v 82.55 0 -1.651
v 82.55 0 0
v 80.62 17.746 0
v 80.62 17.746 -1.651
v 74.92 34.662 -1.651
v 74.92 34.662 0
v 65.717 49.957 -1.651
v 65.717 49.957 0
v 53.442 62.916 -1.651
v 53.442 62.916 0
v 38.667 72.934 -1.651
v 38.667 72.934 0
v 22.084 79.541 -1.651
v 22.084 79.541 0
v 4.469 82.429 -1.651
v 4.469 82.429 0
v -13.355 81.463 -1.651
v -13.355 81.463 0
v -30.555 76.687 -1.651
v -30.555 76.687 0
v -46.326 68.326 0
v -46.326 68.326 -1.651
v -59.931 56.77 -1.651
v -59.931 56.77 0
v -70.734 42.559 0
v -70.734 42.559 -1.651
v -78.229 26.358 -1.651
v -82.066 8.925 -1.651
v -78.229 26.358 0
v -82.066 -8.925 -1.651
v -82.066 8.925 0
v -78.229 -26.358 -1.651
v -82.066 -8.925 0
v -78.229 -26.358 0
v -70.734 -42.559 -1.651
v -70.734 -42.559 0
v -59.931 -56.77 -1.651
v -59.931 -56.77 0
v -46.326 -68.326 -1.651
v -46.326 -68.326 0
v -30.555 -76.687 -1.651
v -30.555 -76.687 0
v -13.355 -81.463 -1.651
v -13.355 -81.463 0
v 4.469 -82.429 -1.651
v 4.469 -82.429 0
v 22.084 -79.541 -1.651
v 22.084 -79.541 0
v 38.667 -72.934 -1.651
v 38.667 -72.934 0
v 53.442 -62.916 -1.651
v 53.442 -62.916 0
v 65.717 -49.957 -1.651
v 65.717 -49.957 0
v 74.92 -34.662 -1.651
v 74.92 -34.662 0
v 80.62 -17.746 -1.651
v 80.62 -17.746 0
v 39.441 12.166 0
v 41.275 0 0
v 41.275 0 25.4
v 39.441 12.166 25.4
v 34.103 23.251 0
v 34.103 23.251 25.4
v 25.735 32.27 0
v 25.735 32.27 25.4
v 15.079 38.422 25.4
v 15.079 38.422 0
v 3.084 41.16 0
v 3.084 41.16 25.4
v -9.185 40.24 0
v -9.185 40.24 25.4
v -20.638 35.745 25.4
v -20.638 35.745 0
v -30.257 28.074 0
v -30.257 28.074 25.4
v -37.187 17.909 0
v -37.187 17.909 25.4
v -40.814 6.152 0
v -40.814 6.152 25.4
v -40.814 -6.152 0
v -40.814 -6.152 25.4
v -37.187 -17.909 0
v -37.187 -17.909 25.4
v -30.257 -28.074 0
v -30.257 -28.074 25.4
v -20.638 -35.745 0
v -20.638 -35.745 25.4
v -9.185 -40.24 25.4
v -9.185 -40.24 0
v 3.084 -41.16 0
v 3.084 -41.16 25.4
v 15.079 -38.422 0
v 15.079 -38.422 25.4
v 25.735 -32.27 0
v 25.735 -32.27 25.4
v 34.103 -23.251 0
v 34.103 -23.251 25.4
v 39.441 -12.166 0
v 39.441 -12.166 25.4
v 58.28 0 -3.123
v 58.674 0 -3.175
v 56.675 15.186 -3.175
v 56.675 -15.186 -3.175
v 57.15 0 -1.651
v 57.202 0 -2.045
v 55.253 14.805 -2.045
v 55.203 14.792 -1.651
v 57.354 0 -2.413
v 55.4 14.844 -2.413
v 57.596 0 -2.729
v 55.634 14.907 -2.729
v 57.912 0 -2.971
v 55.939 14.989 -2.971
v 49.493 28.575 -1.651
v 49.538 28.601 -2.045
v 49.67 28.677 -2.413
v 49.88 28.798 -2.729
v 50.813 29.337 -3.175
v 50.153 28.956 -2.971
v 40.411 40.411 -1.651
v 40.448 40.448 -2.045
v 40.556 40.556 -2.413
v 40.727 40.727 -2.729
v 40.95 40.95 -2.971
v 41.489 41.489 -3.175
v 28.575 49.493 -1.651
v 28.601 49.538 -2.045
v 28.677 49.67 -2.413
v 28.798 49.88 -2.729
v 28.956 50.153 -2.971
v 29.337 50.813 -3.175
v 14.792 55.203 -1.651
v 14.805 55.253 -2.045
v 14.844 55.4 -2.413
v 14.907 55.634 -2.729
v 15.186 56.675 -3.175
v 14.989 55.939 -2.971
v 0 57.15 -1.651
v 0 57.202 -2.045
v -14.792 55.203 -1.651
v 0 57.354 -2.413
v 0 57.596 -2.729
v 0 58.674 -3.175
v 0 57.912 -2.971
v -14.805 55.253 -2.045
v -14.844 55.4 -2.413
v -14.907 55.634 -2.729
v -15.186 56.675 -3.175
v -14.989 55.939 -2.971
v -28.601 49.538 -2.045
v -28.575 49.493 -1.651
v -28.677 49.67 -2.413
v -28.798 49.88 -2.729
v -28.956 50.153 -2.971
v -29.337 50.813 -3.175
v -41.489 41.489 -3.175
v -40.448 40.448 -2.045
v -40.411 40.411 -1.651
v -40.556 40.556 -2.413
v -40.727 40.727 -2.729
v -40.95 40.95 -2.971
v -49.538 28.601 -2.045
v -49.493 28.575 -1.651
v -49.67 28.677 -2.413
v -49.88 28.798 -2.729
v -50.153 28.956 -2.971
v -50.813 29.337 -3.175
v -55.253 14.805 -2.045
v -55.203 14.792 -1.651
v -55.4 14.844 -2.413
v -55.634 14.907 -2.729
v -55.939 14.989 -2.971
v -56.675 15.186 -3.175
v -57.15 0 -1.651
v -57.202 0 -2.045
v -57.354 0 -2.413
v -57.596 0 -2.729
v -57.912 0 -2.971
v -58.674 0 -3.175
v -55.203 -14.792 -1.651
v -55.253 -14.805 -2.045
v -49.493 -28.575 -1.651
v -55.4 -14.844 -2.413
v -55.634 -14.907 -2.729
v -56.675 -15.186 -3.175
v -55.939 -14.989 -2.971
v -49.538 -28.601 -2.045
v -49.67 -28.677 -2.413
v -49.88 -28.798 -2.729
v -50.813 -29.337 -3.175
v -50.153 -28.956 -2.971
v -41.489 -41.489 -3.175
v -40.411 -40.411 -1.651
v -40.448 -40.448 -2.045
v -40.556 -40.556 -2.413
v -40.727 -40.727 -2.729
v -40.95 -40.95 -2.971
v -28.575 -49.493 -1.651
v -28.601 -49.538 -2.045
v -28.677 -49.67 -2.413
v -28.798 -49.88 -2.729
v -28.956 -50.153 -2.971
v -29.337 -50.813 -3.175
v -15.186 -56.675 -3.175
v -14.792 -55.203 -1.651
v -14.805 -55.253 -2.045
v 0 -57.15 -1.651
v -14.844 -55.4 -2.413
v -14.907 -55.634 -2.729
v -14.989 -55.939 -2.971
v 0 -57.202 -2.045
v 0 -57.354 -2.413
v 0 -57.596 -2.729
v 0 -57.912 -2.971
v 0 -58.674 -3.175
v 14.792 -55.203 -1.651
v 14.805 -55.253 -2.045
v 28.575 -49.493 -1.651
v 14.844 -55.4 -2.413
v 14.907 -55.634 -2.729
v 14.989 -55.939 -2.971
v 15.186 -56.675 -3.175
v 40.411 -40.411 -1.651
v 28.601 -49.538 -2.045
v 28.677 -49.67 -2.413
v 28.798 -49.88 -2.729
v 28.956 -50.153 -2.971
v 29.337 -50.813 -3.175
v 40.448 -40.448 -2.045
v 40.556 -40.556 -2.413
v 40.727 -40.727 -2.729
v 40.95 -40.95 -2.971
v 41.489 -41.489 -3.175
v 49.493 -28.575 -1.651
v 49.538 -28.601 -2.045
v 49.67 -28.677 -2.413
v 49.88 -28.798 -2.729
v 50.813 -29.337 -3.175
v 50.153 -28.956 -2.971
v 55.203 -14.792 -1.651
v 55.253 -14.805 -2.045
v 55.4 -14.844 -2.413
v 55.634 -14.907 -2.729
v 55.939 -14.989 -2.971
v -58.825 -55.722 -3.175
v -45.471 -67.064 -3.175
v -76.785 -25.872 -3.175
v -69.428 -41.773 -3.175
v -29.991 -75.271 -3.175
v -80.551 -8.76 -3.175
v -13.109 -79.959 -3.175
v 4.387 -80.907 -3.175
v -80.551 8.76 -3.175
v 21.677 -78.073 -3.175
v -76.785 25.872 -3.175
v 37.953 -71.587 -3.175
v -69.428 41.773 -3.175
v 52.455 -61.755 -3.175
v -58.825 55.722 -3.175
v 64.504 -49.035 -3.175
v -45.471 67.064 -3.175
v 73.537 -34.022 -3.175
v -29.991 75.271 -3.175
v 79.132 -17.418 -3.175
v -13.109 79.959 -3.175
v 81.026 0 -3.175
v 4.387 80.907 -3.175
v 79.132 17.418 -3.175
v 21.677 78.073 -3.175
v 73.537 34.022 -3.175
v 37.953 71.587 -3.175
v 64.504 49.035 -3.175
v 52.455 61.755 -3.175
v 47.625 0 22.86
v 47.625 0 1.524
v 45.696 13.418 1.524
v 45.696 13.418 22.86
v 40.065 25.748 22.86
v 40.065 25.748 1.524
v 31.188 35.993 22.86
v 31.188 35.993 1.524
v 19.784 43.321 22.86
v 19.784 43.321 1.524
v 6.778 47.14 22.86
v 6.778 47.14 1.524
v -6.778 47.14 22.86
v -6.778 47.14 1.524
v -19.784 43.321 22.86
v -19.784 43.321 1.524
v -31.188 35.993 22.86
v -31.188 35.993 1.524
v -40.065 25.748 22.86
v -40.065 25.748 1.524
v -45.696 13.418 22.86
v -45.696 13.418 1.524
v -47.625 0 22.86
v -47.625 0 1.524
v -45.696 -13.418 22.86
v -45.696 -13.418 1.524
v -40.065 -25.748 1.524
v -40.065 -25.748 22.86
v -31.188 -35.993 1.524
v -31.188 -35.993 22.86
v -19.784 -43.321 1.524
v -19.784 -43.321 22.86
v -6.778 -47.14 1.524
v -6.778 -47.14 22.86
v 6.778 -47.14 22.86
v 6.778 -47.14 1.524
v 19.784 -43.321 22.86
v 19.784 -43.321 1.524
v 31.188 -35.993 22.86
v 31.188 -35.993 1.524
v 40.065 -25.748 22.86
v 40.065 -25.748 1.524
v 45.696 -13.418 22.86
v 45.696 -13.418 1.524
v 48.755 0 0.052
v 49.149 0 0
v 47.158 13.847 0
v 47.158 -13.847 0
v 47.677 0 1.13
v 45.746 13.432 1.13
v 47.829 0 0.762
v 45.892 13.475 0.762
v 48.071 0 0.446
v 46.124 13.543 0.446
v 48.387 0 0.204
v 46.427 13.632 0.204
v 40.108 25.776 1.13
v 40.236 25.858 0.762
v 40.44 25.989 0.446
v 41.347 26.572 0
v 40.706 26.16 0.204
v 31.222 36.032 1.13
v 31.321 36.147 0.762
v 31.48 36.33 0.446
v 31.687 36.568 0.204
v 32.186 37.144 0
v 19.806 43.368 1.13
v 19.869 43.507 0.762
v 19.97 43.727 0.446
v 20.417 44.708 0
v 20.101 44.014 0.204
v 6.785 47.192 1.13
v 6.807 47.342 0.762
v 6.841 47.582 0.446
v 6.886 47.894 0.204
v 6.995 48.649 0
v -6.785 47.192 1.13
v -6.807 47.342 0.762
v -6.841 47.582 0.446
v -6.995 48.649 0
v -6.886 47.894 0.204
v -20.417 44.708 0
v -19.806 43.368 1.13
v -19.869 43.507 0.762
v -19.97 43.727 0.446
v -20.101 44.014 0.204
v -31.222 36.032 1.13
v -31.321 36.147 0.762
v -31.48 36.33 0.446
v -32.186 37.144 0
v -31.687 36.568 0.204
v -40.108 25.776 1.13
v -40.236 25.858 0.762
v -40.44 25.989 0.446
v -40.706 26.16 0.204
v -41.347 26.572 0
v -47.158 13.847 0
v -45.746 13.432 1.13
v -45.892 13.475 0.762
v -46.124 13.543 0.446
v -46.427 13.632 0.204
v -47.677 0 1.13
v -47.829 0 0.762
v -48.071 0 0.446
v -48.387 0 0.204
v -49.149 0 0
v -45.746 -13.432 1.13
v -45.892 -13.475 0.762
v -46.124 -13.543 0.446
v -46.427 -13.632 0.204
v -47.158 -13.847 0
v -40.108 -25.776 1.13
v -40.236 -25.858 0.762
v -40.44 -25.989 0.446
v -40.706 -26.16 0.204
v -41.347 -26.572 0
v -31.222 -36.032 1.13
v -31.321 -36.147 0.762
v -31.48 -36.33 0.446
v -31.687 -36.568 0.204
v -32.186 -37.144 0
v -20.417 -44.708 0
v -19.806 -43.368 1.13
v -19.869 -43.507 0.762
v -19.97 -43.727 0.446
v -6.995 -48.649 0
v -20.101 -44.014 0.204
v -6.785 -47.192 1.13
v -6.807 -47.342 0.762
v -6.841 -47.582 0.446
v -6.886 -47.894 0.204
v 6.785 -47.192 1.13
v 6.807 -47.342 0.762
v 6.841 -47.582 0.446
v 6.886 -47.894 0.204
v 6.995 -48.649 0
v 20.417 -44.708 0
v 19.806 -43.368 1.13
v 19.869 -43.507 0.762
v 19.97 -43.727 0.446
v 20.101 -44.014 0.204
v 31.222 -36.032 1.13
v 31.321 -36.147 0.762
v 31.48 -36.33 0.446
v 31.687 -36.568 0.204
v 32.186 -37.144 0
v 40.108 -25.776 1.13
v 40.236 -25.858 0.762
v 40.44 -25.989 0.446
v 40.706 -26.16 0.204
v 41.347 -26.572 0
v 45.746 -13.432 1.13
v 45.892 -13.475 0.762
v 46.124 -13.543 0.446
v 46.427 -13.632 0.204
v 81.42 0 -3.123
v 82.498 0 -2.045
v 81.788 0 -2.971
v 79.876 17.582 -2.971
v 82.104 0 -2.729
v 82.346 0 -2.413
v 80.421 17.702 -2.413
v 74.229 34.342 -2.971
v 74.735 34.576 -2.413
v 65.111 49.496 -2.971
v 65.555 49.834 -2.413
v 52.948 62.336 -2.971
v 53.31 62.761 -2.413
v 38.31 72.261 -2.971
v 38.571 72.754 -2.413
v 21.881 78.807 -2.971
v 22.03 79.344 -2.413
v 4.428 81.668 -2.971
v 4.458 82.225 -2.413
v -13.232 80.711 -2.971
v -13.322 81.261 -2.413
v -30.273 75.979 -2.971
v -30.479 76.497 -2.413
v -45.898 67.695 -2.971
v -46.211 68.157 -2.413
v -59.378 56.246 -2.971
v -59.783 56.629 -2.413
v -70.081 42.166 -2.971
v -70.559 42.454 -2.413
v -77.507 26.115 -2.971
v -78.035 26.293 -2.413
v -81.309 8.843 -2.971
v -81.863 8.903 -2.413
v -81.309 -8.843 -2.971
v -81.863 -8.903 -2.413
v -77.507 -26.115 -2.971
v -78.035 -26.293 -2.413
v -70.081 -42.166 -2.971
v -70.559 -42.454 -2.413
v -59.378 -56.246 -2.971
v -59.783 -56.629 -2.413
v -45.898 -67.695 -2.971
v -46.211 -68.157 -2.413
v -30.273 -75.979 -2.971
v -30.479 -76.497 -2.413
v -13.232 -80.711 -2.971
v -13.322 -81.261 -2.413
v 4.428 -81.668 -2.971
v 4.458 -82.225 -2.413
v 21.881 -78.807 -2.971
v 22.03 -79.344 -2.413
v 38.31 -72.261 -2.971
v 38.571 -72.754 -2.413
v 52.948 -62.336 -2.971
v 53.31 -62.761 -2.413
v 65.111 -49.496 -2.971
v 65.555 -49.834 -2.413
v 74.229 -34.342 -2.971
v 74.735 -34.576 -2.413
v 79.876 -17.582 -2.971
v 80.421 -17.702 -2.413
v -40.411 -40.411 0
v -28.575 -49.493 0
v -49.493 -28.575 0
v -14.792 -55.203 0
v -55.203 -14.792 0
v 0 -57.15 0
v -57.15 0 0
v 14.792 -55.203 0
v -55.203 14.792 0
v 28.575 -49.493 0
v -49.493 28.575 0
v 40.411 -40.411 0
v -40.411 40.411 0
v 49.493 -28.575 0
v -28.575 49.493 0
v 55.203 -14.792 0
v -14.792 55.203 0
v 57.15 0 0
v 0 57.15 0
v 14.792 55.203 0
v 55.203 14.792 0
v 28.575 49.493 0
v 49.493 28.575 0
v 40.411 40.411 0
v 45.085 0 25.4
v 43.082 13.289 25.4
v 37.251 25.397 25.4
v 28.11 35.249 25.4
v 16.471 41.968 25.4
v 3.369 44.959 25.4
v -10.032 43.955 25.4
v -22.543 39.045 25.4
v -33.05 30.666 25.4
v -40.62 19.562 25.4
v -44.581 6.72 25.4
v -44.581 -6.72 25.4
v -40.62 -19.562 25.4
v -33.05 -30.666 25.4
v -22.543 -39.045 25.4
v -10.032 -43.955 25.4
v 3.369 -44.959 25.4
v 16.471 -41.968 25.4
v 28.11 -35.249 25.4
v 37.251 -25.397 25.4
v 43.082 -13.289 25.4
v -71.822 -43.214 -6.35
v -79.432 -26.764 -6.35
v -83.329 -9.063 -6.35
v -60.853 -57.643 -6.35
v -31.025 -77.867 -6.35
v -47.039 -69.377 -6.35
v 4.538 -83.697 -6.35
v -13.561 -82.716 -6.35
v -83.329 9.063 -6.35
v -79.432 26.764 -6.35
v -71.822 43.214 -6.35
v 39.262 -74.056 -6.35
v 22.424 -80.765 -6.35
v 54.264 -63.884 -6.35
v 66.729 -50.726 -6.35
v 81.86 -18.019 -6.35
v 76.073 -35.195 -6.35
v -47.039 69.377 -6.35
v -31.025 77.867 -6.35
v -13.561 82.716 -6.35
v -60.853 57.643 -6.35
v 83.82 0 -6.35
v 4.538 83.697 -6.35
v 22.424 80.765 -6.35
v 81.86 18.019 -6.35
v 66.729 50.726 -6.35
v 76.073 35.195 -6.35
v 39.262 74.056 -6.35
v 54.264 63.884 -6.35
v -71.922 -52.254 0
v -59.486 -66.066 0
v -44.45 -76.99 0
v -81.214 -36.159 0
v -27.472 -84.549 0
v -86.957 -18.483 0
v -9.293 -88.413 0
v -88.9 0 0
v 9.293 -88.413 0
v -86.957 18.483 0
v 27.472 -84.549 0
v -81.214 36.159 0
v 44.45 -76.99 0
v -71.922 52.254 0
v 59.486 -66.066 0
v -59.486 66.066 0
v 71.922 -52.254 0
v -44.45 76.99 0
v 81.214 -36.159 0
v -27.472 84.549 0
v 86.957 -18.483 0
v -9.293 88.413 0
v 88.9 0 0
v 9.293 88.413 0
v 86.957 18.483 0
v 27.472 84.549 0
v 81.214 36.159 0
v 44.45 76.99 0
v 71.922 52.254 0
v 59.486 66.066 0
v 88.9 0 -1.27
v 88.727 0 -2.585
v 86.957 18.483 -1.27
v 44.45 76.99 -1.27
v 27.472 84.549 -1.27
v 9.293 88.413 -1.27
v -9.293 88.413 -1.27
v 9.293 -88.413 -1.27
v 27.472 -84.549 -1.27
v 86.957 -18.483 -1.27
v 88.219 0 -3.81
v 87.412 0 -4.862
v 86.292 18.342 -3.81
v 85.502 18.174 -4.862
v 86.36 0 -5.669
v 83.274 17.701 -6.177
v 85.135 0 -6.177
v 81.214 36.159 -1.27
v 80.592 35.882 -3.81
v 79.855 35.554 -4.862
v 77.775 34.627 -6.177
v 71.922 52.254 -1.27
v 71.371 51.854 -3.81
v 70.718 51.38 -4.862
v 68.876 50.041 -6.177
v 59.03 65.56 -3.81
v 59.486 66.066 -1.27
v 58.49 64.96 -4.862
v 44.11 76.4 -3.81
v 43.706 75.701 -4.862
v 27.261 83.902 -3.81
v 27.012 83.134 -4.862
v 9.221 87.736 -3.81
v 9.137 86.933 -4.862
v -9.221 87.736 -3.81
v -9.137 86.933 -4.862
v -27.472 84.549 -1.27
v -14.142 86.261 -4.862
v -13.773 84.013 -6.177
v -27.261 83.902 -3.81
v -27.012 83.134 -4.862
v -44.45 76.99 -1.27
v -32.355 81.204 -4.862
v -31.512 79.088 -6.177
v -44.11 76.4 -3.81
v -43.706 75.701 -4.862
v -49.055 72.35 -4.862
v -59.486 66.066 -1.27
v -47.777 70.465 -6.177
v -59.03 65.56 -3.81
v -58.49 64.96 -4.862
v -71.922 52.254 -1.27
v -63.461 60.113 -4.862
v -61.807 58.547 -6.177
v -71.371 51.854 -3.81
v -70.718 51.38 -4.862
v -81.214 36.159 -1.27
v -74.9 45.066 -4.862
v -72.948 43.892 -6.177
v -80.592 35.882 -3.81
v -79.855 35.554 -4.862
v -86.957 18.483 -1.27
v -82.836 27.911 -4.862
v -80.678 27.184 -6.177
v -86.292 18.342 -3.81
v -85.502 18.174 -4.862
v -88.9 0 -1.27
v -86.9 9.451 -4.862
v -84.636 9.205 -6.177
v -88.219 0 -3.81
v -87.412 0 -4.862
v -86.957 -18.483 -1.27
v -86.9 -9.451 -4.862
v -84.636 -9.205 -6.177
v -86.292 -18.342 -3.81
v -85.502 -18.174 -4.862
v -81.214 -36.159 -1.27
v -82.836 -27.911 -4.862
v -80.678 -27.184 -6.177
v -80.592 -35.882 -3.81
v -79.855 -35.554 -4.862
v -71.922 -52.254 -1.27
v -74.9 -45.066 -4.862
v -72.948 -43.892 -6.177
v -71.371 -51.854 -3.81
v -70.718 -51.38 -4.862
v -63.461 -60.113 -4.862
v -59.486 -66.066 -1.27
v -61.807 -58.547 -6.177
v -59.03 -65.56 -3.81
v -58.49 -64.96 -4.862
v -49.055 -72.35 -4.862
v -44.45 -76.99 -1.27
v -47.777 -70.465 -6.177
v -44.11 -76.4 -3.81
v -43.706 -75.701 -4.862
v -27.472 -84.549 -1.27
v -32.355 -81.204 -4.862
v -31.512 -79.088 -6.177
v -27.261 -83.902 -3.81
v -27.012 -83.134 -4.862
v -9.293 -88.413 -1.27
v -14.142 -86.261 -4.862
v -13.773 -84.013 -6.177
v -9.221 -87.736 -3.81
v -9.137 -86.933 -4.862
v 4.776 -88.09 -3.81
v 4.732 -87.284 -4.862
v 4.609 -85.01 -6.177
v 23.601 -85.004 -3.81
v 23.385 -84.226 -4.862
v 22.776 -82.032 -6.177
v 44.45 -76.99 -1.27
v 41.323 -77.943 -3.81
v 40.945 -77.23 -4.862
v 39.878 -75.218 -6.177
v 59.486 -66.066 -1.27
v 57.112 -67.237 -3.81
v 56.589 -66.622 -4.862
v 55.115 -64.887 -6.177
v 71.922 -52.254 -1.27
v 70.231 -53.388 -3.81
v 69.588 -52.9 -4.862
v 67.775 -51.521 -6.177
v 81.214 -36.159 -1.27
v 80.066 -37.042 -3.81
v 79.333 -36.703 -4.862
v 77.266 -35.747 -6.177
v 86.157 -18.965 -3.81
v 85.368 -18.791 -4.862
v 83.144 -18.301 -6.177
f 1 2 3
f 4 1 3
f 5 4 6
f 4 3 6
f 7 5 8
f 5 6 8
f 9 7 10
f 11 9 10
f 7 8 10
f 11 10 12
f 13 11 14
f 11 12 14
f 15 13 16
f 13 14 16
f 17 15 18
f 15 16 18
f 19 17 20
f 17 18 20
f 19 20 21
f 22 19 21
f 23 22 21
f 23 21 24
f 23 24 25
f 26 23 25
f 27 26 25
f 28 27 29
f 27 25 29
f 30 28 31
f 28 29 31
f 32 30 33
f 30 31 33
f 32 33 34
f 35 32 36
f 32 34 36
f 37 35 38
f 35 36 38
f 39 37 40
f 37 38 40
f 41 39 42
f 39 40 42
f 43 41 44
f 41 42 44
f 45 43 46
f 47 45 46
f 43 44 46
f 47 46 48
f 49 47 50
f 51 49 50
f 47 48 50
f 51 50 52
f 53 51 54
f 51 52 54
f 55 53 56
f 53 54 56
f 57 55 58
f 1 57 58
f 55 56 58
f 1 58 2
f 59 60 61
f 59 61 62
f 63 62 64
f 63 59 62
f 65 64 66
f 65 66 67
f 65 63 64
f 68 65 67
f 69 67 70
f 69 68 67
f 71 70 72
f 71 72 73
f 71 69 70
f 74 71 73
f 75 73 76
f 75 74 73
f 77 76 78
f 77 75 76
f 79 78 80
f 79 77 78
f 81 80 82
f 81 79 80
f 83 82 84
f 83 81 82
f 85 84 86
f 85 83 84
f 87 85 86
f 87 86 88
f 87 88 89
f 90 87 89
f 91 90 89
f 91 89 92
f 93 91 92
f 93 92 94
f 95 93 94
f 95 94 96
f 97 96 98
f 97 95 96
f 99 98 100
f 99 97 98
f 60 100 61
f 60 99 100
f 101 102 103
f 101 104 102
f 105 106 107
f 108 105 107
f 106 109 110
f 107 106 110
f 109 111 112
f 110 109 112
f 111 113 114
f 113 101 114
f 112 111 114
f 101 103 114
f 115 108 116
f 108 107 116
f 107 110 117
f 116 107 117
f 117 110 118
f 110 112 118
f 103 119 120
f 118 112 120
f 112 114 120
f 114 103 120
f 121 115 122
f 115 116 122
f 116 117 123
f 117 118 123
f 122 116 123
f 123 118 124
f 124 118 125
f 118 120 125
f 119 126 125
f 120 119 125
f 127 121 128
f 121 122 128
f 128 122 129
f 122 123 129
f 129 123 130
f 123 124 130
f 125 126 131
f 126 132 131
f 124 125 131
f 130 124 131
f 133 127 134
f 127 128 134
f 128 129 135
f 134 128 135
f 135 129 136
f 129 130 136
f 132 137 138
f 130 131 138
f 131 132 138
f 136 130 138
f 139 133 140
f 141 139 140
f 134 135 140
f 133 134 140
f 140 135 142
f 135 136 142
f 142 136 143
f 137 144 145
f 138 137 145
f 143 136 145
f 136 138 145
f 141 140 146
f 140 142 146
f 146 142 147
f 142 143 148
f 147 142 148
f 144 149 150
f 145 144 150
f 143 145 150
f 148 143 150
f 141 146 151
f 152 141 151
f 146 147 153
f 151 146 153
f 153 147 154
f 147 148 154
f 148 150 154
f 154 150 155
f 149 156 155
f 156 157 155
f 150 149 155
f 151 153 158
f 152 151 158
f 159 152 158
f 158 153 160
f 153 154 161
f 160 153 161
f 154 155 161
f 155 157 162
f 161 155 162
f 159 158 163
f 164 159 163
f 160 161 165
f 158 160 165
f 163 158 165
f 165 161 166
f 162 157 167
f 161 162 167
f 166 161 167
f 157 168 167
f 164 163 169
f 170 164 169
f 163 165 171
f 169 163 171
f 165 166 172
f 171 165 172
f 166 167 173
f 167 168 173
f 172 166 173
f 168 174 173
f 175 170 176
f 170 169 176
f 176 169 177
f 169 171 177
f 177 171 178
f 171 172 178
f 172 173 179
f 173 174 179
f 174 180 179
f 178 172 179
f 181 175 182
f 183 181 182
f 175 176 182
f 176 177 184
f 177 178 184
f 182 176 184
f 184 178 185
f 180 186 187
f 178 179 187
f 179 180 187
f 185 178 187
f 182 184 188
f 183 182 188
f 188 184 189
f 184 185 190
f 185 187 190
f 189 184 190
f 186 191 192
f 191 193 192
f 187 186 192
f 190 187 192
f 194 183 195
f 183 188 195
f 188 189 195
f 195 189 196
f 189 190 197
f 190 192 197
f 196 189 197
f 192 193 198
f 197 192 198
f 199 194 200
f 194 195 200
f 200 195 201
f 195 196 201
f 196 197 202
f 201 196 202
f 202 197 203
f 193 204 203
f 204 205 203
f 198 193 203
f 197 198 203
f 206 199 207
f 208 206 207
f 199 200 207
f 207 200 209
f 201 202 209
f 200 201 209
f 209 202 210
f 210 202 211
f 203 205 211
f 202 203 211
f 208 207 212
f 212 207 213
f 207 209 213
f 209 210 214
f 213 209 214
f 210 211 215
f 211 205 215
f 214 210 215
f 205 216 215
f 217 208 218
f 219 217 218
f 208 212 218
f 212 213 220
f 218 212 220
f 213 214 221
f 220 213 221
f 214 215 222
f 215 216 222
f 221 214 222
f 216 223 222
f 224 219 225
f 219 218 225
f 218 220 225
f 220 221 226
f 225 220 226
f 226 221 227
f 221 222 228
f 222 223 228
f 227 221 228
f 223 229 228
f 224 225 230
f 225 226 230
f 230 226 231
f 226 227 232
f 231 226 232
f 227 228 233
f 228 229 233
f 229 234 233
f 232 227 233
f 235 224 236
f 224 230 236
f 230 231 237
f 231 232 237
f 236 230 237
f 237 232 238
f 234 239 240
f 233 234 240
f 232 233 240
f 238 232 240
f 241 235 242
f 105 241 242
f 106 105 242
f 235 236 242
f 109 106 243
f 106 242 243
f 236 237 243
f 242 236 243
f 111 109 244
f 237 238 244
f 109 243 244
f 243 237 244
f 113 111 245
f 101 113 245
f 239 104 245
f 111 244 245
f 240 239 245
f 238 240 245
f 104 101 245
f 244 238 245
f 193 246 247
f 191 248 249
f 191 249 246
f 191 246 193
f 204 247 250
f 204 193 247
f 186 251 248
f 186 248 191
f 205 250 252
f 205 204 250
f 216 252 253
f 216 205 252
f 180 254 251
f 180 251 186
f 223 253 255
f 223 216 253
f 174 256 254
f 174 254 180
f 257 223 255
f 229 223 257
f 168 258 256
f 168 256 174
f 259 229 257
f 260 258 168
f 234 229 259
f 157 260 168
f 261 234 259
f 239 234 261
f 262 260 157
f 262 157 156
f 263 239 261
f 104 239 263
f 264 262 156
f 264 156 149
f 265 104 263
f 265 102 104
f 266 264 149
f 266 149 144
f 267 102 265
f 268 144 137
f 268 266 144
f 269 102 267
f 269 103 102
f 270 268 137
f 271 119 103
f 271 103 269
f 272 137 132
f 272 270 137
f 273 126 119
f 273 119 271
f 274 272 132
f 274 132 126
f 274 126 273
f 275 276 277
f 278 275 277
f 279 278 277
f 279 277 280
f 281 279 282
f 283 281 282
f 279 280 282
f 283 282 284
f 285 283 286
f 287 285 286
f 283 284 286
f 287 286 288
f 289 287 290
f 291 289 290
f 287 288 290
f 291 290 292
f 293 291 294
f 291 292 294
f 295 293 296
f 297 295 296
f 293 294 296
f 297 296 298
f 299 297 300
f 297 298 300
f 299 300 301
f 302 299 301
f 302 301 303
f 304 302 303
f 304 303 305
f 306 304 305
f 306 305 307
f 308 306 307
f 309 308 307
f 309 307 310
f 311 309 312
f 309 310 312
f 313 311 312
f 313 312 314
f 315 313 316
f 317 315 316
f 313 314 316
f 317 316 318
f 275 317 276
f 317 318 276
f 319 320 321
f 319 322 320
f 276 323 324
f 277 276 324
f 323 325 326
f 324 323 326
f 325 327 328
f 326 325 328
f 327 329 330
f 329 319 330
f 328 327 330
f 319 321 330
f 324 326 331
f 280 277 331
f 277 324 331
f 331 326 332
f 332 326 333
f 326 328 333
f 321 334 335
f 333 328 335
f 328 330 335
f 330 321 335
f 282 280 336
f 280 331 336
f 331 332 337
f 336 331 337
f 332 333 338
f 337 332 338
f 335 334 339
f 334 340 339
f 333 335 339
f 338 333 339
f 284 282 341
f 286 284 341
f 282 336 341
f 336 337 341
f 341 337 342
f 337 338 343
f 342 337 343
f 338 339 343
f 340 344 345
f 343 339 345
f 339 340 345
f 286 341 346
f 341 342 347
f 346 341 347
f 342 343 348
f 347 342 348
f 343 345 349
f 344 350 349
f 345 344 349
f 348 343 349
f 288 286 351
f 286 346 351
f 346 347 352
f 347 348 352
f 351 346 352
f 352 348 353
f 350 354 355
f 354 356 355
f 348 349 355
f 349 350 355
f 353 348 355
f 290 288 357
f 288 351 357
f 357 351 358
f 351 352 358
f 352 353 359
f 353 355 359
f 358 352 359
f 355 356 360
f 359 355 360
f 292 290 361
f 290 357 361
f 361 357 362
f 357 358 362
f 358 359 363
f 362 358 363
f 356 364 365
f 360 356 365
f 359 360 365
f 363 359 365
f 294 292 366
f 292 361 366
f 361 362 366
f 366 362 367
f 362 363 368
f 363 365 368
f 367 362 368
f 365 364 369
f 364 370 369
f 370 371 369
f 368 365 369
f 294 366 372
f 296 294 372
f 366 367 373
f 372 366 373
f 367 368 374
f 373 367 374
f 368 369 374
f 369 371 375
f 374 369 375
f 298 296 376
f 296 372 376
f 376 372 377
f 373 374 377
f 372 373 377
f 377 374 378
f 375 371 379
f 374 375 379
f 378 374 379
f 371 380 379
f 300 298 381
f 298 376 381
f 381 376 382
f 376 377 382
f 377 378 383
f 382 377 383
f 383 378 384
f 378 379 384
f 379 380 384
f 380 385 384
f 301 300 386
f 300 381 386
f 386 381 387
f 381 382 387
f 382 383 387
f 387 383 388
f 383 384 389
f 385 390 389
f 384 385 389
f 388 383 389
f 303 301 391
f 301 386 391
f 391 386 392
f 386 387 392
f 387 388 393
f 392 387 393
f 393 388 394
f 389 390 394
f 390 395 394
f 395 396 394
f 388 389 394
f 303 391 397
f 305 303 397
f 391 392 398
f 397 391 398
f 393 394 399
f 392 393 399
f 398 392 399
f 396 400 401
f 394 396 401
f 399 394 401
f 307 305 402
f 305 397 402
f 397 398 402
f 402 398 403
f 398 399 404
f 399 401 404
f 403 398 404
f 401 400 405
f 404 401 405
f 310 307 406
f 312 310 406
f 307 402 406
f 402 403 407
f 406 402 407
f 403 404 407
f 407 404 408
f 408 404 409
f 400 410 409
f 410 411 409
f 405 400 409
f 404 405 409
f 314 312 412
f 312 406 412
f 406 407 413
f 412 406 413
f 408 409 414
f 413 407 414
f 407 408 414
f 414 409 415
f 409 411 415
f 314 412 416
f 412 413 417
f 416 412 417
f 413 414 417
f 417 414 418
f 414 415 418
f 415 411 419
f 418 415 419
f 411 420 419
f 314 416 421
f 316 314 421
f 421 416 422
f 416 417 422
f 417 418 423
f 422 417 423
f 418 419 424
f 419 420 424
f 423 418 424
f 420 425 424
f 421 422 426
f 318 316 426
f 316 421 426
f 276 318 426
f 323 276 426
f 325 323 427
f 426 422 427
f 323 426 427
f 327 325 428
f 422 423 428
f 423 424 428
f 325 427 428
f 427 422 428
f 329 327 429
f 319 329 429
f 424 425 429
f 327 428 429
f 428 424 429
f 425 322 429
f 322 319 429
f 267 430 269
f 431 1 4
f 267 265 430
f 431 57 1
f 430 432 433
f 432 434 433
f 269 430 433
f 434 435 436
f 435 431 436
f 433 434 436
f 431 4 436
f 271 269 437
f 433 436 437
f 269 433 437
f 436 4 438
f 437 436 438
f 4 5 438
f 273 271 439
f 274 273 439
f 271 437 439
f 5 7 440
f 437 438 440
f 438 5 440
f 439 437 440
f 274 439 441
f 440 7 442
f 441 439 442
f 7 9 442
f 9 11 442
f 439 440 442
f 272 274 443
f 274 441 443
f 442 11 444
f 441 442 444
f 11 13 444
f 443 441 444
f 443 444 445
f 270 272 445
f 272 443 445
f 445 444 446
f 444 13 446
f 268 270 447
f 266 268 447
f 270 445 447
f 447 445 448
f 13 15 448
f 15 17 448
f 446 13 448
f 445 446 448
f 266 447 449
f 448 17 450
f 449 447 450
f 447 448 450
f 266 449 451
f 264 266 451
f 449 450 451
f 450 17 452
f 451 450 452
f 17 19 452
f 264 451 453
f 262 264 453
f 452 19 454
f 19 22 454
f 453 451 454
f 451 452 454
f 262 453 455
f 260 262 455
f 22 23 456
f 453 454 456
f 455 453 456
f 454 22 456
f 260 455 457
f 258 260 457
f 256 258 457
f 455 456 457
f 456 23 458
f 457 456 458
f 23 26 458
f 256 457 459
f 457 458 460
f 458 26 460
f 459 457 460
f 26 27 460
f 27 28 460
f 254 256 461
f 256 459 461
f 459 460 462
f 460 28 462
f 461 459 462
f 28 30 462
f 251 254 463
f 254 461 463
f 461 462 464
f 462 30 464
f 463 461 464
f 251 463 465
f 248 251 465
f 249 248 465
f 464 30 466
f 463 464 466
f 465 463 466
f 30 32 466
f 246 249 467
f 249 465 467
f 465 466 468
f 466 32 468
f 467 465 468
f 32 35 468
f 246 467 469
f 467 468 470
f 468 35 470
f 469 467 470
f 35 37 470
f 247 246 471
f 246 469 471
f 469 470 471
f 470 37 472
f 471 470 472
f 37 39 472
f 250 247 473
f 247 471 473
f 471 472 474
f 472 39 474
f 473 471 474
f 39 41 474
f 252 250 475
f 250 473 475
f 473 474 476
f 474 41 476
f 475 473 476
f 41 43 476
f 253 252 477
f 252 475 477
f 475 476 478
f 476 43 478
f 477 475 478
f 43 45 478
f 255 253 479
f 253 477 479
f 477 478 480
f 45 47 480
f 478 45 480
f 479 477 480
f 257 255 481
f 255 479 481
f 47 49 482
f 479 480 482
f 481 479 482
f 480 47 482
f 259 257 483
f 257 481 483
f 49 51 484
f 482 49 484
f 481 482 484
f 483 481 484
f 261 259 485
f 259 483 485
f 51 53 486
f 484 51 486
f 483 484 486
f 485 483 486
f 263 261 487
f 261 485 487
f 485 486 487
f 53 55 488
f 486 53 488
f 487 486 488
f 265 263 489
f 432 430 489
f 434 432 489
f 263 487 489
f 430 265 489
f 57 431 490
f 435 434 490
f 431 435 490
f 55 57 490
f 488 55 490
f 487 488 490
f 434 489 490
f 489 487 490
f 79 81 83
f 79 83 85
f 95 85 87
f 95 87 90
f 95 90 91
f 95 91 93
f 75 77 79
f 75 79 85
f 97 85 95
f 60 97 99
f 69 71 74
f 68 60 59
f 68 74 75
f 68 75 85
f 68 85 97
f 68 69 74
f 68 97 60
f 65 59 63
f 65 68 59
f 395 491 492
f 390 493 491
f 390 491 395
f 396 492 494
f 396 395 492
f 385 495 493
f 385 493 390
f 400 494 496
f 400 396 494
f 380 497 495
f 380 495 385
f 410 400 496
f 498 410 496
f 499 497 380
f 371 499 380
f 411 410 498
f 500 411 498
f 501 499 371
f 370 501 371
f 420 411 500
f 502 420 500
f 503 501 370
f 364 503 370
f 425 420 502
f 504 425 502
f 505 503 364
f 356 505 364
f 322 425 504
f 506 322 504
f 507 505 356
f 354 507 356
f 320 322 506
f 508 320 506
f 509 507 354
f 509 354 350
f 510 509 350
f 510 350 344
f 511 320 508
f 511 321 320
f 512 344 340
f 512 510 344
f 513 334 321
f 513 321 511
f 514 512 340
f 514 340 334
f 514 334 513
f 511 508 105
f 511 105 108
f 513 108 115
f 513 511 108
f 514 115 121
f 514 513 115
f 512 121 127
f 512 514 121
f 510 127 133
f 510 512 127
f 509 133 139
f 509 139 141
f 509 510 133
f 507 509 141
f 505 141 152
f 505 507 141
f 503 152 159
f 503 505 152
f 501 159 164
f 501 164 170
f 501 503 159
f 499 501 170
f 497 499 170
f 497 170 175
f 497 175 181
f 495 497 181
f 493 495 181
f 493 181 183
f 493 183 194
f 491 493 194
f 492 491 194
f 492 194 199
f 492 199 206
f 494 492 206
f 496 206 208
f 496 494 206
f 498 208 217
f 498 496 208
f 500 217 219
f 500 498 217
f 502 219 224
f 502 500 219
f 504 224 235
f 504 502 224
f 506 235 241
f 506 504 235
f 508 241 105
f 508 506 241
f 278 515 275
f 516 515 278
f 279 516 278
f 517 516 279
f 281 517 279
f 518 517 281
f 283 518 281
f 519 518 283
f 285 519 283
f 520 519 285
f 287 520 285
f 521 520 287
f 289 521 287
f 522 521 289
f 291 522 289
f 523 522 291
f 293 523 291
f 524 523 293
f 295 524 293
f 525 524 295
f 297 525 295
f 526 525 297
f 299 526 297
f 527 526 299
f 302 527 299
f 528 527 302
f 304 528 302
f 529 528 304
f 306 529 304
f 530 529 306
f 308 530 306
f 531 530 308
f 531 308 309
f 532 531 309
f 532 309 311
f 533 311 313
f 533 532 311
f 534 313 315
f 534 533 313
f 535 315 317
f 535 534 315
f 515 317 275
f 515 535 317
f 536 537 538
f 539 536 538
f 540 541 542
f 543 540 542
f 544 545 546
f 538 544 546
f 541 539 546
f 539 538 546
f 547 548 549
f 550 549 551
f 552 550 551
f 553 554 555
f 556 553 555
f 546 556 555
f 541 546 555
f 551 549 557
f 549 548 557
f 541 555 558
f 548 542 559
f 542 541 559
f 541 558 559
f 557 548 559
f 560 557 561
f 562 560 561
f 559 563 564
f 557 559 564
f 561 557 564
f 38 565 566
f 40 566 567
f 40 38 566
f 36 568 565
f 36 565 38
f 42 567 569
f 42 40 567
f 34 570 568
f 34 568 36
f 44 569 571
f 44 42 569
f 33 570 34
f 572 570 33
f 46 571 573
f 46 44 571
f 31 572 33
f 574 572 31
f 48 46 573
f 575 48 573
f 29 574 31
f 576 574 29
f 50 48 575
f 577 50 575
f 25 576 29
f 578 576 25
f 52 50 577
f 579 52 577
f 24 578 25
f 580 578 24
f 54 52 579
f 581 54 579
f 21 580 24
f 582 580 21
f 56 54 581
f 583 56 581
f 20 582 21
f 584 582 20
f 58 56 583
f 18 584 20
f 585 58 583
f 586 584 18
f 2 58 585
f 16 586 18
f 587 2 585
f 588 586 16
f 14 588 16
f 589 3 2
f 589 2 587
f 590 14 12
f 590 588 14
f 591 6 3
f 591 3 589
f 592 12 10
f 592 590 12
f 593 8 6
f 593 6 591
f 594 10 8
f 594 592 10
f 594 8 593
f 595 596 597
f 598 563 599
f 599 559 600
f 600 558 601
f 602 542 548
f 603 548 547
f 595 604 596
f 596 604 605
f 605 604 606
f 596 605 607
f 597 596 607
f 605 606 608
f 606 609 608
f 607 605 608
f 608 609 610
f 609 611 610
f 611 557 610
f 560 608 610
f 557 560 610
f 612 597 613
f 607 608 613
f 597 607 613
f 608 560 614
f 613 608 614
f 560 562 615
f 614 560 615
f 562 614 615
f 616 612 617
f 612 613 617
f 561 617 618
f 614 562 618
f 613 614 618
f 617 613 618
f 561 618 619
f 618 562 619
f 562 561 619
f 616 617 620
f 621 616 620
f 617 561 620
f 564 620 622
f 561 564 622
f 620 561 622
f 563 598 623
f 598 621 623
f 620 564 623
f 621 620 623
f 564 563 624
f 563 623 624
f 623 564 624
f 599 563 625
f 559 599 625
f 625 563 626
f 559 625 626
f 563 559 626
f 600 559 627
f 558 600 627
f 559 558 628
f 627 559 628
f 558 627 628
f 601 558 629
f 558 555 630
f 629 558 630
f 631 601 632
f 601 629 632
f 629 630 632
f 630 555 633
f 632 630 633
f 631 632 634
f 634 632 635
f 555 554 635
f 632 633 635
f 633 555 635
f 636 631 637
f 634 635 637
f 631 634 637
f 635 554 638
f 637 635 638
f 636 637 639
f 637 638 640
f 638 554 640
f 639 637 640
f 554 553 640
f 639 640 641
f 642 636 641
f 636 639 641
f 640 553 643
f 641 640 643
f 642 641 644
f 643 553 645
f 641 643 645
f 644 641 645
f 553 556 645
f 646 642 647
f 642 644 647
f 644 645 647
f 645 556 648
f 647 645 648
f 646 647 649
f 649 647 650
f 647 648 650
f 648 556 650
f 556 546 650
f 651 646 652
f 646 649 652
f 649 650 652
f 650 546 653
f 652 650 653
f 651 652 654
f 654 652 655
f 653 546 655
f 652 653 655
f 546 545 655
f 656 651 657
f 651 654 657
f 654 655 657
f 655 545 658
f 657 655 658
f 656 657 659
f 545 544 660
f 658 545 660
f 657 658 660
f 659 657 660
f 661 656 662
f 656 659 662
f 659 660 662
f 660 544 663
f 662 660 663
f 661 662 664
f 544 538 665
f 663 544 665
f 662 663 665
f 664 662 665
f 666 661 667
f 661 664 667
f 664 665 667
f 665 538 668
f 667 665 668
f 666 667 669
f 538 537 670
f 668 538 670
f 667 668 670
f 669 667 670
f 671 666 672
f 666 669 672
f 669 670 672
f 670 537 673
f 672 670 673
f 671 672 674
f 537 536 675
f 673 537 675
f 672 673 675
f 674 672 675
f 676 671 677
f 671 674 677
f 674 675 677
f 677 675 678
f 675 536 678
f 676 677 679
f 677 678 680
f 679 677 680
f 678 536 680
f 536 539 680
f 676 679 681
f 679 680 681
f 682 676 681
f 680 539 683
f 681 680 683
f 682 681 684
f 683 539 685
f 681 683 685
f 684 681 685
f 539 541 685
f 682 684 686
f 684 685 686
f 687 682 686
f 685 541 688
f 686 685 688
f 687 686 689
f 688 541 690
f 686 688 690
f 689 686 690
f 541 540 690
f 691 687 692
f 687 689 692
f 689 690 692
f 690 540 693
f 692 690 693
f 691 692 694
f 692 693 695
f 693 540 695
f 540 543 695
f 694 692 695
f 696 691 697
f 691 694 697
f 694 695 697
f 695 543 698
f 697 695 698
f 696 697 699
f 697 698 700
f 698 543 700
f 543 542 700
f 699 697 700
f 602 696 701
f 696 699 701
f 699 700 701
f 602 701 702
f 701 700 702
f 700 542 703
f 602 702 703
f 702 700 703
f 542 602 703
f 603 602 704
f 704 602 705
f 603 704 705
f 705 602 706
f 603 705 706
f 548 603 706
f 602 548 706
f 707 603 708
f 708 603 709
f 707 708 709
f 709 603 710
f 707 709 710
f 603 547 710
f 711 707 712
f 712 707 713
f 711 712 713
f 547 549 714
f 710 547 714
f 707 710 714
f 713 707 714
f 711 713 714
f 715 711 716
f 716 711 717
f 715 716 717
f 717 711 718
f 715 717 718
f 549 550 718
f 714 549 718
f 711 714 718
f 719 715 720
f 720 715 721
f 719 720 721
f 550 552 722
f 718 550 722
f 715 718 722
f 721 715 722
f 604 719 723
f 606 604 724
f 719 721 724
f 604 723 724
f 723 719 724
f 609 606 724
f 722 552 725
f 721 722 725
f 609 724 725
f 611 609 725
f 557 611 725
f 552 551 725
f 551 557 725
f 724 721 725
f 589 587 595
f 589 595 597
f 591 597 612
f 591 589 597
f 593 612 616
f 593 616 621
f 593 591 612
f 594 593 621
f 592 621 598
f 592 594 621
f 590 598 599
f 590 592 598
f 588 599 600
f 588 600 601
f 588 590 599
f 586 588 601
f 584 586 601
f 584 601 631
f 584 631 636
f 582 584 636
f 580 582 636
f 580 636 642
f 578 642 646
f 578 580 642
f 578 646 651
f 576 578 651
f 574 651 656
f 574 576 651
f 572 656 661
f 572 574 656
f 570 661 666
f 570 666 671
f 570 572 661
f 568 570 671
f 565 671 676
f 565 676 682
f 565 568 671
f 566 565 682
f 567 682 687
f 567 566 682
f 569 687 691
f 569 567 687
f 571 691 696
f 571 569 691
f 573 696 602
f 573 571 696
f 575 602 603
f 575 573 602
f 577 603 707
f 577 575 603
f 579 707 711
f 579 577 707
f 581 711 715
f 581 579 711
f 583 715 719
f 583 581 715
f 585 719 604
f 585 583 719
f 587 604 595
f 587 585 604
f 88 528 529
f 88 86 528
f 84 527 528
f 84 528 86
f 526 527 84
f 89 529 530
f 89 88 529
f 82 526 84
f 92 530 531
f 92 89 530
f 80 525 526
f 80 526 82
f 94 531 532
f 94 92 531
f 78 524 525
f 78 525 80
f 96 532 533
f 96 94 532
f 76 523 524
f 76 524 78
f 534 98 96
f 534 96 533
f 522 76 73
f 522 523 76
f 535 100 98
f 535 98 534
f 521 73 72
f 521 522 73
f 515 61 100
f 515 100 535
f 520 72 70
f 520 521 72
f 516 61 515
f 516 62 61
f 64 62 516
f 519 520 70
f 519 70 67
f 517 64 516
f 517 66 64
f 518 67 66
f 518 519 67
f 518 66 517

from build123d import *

# Parameters (mm, degrees)
F1_R      = 47.625
F2_DEPTH  = 25.4
F0_R      = 88.9
F2_FACE_R = 47.625
F3_DEPTH  = 6.35
F4_R      = 5.08
F5_SIZE   = 2.54
F6_R      = 82.55
F6_R_2    = 57.15
F8_DEPTH  = 3.175
F7_R      = 41.275
F9_DEPTH  = 25.4
F10_R     = 1.524


with BuildPart() as f2:
    # F1 (on Top) → F2 (new body)
    with BuildSketch(Plane.XY):
        Circle(F1_R)
    extrude(amount=F2_DEPTH)

    # F0 (on Top) + F2_face (on face) → F3 (join)
    with BuildSketch(Plane.XY):
        Circle(F0_R)
    with BuildSketch(Plane.XY.offset(25.4)):
        Circle(F2_FACE_R)
    extrude(amount=-F3_DEPTH)

    # F4
    f4_edges = [f2.edges().sort_by_distance(p)[0] for p in [
        (-88.9, 0, -6.35),
    ]]
    fillet(f4_edges, radius=F4_R)

    # F5
    f5_edges = [f2.edges().sort_by_distance(p)[0] for p in [
        (-47.625, 0, 25.4),
    ]]
    chamfer(f5_edges, length=F5_SIZE)

    # F6 (on Top) → F8 (cut)
    with BuildSketch(Plane.XY):
        Circle(F6_R)
        Circle(F6_R_2, mode=Mode.SUBTRACT)
    extrude(amount=-F8_DEPTH, mode=Mode.SUBTRACT)

    # F7 (on Top) → F9 (cut)
    with BuildSketch(Plane.XY):
        Circle(F7_R)
    extrude(amount=F9_DEPTH, mode=Mode.SUBTRACT)

    # F10
    f10_edges = [f2.edges().sort_by_distance(p)[0] for p in [
        (-82.55, 0, -3.175),
        (-57.15, 0, -3.175),
        (-47.625, 0, 0),
    ]]
    fillet(f10_edges, radius=F10_R)


solid = f2.part
